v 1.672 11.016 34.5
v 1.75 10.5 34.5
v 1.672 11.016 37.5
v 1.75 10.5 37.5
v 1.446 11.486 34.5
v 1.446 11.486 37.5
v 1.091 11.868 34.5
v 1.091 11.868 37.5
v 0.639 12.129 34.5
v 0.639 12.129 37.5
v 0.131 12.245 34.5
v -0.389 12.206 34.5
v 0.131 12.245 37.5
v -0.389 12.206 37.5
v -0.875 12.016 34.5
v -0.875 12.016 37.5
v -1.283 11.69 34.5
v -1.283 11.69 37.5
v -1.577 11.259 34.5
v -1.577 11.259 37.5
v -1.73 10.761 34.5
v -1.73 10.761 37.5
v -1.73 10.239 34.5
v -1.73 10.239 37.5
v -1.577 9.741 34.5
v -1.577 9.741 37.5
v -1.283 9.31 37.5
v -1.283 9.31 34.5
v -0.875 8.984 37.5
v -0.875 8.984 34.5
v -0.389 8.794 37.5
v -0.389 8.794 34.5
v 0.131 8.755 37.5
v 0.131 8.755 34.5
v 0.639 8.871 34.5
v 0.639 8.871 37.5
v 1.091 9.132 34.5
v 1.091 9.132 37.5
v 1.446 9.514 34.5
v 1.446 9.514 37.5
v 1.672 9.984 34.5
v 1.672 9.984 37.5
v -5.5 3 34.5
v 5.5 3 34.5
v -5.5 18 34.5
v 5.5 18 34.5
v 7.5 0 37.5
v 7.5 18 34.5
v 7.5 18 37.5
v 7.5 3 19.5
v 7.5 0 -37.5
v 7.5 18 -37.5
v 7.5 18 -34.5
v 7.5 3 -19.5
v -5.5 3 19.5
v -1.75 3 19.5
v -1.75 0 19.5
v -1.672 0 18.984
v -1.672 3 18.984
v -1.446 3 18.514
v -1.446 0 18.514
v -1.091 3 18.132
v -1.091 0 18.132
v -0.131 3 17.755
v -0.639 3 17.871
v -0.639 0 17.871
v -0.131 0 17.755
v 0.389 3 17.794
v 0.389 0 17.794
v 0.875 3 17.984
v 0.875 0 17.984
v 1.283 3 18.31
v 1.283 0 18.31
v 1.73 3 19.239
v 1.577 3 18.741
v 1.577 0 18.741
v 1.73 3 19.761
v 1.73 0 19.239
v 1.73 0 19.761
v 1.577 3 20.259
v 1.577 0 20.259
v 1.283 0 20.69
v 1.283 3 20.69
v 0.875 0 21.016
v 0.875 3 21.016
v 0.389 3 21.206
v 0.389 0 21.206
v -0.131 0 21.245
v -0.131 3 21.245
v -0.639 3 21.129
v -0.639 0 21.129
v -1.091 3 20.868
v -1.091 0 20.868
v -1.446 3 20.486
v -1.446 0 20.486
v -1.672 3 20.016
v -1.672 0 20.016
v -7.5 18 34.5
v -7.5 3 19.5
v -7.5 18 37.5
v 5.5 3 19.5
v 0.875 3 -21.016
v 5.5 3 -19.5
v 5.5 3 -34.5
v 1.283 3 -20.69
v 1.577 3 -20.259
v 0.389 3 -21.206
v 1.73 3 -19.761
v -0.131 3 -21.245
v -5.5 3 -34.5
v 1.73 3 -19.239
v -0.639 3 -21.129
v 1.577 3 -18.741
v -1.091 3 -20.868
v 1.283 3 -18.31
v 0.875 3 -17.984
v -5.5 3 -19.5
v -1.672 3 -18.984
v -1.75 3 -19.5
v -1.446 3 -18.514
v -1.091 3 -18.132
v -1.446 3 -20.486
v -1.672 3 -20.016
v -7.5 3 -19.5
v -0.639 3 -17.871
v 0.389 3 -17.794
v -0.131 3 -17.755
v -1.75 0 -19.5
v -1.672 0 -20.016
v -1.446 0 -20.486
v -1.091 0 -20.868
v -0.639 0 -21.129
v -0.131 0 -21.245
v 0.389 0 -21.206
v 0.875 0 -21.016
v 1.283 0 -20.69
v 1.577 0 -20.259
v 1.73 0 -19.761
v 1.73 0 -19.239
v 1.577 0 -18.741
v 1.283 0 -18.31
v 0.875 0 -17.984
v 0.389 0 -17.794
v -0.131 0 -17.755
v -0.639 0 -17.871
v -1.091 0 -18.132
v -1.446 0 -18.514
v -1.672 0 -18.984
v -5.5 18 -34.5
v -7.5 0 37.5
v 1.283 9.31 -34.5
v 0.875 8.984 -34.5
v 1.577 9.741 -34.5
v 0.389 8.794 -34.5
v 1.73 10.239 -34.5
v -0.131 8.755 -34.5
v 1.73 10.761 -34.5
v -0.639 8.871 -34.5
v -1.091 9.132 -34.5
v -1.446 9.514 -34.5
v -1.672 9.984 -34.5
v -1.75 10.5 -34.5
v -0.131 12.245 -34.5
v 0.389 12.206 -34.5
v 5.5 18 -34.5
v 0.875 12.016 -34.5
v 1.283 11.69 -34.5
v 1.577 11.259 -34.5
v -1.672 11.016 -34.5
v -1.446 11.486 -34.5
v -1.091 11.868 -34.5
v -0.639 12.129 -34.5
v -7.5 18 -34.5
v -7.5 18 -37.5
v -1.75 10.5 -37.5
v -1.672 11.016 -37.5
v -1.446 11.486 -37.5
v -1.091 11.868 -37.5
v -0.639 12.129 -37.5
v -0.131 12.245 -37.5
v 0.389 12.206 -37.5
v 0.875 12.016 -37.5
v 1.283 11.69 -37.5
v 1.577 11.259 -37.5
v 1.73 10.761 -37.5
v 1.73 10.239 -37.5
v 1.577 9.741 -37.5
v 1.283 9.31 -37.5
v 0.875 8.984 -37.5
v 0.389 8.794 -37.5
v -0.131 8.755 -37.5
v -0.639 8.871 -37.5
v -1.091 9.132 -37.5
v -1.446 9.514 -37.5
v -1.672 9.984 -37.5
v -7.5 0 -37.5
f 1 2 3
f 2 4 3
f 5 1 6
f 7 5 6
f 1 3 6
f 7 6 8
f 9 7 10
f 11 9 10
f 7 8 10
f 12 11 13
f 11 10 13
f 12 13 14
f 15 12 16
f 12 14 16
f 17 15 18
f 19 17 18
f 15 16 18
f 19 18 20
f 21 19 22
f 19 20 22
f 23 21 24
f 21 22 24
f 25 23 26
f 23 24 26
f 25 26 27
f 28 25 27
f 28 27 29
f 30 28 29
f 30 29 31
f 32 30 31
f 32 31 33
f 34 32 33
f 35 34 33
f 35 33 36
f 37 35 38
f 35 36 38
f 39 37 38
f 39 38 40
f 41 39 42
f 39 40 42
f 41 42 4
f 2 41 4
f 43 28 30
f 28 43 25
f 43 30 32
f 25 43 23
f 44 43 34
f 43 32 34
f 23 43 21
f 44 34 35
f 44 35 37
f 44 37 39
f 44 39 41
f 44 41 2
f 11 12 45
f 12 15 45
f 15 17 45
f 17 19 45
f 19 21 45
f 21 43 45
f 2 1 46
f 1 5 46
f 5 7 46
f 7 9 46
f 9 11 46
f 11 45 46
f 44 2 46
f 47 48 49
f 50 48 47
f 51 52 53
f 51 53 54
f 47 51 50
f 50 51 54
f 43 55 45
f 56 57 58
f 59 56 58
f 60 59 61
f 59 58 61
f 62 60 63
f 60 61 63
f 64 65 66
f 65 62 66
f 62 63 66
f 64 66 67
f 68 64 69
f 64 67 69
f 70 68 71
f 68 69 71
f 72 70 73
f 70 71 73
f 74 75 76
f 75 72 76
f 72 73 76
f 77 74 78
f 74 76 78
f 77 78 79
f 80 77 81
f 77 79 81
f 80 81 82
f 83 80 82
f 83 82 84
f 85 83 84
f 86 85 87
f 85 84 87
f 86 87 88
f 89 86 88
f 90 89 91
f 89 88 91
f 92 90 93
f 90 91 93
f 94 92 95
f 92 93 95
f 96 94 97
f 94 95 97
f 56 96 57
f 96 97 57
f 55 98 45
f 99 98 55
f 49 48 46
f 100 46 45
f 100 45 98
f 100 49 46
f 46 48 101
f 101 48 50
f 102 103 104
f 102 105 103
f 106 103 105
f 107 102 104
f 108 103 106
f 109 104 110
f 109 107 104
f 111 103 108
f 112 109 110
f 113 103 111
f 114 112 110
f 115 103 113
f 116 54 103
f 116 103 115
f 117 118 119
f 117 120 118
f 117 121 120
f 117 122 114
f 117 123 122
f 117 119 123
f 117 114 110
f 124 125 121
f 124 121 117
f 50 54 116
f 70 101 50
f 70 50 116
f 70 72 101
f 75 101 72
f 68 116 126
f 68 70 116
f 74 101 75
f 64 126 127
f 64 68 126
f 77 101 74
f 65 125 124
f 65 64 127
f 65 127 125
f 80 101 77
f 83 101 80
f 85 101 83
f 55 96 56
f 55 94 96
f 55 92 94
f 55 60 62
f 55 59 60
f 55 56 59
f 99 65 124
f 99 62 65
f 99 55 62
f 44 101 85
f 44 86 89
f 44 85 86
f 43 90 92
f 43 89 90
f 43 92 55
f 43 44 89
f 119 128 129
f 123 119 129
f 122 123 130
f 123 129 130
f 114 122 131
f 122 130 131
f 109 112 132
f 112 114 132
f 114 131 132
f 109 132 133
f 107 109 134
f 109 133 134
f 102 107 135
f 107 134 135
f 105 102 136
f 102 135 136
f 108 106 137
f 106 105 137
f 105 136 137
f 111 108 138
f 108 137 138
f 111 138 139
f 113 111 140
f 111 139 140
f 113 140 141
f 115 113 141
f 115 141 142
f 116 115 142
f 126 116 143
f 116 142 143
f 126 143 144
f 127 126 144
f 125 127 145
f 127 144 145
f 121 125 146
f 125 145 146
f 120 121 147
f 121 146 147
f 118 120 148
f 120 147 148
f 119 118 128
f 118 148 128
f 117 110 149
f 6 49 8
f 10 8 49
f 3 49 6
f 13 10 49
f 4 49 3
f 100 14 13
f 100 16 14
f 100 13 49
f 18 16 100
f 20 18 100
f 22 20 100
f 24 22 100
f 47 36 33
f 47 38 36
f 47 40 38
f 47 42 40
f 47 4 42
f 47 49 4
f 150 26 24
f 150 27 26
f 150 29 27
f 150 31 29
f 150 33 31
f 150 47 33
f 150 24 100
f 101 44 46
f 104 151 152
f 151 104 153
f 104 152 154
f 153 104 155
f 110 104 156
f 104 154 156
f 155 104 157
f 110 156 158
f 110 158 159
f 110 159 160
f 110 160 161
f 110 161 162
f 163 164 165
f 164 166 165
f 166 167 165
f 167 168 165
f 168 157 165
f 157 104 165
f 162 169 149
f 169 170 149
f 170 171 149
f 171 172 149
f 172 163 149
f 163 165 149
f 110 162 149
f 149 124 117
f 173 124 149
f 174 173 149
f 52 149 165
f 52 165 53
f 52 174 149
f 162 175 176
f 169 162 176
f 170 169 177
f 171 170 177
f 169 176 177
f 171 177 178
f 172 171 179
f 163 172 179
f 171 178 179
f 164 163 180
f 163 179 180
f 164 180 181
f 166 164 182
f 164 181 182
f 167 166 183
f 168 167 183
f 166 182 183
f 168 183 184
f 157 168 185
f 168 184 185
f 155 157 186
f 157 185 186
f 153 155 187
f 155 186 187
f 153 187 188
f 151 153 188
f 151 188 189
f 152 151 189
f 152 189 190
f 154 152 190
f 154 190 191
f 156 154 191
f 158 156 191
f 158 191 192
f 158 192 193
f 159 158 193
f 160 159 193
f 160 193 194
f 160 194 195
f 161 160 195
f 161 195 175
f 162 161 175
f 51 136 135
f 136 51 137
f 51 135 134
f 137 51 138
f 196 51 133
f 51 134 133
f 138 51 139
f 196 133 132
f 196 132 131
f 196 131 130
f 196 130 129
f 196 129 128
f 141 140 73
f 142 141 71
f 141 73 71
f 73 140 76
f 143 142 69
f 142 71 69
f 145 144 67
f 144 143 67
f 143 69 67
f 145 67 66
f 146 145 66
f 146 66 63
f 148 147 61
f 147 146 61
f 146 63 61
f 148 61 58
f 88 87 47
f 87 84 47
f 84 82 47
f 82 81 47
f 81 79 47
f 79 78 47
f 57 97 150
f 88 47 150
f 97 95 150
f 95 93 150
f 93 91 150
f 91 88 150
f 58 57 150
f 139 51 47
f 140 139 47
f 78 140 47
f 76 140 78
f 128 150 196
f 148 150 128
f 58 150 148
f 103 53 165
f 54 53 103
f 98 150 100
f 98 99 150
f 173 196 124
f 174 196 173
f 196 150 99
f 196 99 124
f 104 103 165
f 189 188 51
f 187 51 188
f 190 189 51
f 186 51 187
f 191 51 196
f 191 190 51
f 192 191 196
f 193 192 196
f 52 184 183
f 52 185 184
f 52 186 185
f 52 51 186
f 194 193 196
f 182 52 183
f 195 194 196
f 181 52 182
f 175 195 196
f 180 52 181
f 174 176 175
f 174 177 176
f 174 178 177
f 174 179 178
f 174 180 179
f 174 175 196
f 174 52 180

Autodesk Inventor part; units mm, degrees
ref_plane "YZ Plane" through (0, 0, 0) normal (1, 0, 0) x (0, 1, 0)
ref_plane "XZ Plane" through (0, 0, 0) normal (0, 1, 0) x (-1, 0, 0)
ref_plane "XY Plane" through (0, 0, 0) normal (0, 0, 1) x (1, 0, 0)
sketch "Sketch1" plane through (0, 0, 0) normal (0, 1, 0) x (-1, 0, 0)
  line L0 (-7.5, 37.5) -> (7.5, 37.5)
  line L1 (7.5, 37.5) -> (7.5, -37.5)
  line L2 (7.5, -37.5) -> (-7.5, -37.5)
  line L3 (-7.5, -37.5) -> (-7.5, 37.5)
  line L4 (-7.5, 37.5) -> (7.5, -37.5) construction
  line L5 (7.5, 37.5) -> (-7.5, -37.5) construction
  circle A0 centre (0, 19.5) radius 1.75
  circle A1 centre (0, -19.5) radius 1.75
  point P0 (0, 0)
  point P1 (0, -37.5)
  dimension "d0" = 15
  dimension "d1" = 75
  dimension "d13" = 18
  dimension "d14" = 18
  dimension "d16" = 3.5
extrude "Extrusion1" add sketch "Sketch1" along normal blind 3
sketch "Sketch2" plane through (-7.5, 0, 37.5) normal (0, 0, 1) x (1, 0, 0)
  line L0 (0, 0) -> (15, 0) projected
  line L1 (15, 0) -> (15, 3) projected
  line L2 (0, 3) -> (15, 3) projected
  line L3 (0, 0) -> (0, 3) projected
  line L4 (15, 3) -> (0, 3) projected
  line L5 (0, 3) -> (15, 3)
  line L6 (15, 3) -> (15, 18)
  line L7 (15, 18) -> (0, 18)
  line L8 (0, 18) -> (0, 3)
  circle A0 centre (7.5, 10.5) radius 1.75
  point P0 (7.5, 0)
  point P1 (7.5, 18)
  point P2 (0, 10.5)
  dimension "d15" = 3.5
extrude "Extrusion2" add sketch "Sketch2" against normal blind 3 contours L8 L7 L6 L2
sketch "Sketch3" plane through (7.5, 0, -37.5) normal (0, 0, -1) x (-1, 0, 0)
  line L0 (15, 18) -> (0, 18) projected
  line L1 (0, 18) -> (0, 3) projected
  line L2 (15, 3) -> (0, 3) projected
  line L3 (15, 3) -> (15, 18) projected
  circle A0 centre (7.5, 10.5) radius 1.75 projected
  point P0 (7.5, 0)
extrude "Extrusion3" add sketch "Sketch3" against normal blind 3
sketch "Sketch4" plane through (7.5, 0, 37.5) normal (1, 0, 0) x (0, 0, -1)
  line L0 (0, 0) -> (75, 0) projected
  line L1 (75, 0) -> (75, 18) projected
  line L2 (75, 18) -> (72, 18) projected
  line L3 (72, 3) -> (72, 18) projected
  line L4 (3, 3) -> (72, 3) projected
  line L5 (3, 18) -> (3, 3) projected
  line L6 (0, 18) -> (3, 18) projected
  line L7 (0, 0) -> (0, 18) projected
  line L8 (3, 18) -> (18, 3)
  line L9 (72, 3) -> (72, 18) projected
  line L10 (72, 18) -> (57, 3)
  line L11 (72, 3) -> (3, 3) projected
  point P0 (37.5, 0)
  dimension "d8" = 45
extrude "Extrusion4" add sketch "Sketch4" against normal blind 2 contours L8 L4 L5 | L3 L4 L10
sketch "Sketch5" plane through (-7.5, 0, -37.5) normal (-1, 0, 0) x (0, 0, 1)
  line L0 (18, 3) -> (3, 3) projected
  line L1 (18, 3) -> (3, 18) projected
  line L2 (3, 3) -> (3, 18) projected
  line L3 (72, 3) -> (57, 3) projected
  line L4 (72, 18) -> (72, 3) projected
  line L5 (72, 18) -> (57, 3) projected
  point P0 (37.5, 0)
extrude "Extrusion5" add sketch "Sketch5" against normal blind 2
equation "\"d14\" = d13"
properties part number "Frame_Brace_Mount" material "ABS Plastic"
